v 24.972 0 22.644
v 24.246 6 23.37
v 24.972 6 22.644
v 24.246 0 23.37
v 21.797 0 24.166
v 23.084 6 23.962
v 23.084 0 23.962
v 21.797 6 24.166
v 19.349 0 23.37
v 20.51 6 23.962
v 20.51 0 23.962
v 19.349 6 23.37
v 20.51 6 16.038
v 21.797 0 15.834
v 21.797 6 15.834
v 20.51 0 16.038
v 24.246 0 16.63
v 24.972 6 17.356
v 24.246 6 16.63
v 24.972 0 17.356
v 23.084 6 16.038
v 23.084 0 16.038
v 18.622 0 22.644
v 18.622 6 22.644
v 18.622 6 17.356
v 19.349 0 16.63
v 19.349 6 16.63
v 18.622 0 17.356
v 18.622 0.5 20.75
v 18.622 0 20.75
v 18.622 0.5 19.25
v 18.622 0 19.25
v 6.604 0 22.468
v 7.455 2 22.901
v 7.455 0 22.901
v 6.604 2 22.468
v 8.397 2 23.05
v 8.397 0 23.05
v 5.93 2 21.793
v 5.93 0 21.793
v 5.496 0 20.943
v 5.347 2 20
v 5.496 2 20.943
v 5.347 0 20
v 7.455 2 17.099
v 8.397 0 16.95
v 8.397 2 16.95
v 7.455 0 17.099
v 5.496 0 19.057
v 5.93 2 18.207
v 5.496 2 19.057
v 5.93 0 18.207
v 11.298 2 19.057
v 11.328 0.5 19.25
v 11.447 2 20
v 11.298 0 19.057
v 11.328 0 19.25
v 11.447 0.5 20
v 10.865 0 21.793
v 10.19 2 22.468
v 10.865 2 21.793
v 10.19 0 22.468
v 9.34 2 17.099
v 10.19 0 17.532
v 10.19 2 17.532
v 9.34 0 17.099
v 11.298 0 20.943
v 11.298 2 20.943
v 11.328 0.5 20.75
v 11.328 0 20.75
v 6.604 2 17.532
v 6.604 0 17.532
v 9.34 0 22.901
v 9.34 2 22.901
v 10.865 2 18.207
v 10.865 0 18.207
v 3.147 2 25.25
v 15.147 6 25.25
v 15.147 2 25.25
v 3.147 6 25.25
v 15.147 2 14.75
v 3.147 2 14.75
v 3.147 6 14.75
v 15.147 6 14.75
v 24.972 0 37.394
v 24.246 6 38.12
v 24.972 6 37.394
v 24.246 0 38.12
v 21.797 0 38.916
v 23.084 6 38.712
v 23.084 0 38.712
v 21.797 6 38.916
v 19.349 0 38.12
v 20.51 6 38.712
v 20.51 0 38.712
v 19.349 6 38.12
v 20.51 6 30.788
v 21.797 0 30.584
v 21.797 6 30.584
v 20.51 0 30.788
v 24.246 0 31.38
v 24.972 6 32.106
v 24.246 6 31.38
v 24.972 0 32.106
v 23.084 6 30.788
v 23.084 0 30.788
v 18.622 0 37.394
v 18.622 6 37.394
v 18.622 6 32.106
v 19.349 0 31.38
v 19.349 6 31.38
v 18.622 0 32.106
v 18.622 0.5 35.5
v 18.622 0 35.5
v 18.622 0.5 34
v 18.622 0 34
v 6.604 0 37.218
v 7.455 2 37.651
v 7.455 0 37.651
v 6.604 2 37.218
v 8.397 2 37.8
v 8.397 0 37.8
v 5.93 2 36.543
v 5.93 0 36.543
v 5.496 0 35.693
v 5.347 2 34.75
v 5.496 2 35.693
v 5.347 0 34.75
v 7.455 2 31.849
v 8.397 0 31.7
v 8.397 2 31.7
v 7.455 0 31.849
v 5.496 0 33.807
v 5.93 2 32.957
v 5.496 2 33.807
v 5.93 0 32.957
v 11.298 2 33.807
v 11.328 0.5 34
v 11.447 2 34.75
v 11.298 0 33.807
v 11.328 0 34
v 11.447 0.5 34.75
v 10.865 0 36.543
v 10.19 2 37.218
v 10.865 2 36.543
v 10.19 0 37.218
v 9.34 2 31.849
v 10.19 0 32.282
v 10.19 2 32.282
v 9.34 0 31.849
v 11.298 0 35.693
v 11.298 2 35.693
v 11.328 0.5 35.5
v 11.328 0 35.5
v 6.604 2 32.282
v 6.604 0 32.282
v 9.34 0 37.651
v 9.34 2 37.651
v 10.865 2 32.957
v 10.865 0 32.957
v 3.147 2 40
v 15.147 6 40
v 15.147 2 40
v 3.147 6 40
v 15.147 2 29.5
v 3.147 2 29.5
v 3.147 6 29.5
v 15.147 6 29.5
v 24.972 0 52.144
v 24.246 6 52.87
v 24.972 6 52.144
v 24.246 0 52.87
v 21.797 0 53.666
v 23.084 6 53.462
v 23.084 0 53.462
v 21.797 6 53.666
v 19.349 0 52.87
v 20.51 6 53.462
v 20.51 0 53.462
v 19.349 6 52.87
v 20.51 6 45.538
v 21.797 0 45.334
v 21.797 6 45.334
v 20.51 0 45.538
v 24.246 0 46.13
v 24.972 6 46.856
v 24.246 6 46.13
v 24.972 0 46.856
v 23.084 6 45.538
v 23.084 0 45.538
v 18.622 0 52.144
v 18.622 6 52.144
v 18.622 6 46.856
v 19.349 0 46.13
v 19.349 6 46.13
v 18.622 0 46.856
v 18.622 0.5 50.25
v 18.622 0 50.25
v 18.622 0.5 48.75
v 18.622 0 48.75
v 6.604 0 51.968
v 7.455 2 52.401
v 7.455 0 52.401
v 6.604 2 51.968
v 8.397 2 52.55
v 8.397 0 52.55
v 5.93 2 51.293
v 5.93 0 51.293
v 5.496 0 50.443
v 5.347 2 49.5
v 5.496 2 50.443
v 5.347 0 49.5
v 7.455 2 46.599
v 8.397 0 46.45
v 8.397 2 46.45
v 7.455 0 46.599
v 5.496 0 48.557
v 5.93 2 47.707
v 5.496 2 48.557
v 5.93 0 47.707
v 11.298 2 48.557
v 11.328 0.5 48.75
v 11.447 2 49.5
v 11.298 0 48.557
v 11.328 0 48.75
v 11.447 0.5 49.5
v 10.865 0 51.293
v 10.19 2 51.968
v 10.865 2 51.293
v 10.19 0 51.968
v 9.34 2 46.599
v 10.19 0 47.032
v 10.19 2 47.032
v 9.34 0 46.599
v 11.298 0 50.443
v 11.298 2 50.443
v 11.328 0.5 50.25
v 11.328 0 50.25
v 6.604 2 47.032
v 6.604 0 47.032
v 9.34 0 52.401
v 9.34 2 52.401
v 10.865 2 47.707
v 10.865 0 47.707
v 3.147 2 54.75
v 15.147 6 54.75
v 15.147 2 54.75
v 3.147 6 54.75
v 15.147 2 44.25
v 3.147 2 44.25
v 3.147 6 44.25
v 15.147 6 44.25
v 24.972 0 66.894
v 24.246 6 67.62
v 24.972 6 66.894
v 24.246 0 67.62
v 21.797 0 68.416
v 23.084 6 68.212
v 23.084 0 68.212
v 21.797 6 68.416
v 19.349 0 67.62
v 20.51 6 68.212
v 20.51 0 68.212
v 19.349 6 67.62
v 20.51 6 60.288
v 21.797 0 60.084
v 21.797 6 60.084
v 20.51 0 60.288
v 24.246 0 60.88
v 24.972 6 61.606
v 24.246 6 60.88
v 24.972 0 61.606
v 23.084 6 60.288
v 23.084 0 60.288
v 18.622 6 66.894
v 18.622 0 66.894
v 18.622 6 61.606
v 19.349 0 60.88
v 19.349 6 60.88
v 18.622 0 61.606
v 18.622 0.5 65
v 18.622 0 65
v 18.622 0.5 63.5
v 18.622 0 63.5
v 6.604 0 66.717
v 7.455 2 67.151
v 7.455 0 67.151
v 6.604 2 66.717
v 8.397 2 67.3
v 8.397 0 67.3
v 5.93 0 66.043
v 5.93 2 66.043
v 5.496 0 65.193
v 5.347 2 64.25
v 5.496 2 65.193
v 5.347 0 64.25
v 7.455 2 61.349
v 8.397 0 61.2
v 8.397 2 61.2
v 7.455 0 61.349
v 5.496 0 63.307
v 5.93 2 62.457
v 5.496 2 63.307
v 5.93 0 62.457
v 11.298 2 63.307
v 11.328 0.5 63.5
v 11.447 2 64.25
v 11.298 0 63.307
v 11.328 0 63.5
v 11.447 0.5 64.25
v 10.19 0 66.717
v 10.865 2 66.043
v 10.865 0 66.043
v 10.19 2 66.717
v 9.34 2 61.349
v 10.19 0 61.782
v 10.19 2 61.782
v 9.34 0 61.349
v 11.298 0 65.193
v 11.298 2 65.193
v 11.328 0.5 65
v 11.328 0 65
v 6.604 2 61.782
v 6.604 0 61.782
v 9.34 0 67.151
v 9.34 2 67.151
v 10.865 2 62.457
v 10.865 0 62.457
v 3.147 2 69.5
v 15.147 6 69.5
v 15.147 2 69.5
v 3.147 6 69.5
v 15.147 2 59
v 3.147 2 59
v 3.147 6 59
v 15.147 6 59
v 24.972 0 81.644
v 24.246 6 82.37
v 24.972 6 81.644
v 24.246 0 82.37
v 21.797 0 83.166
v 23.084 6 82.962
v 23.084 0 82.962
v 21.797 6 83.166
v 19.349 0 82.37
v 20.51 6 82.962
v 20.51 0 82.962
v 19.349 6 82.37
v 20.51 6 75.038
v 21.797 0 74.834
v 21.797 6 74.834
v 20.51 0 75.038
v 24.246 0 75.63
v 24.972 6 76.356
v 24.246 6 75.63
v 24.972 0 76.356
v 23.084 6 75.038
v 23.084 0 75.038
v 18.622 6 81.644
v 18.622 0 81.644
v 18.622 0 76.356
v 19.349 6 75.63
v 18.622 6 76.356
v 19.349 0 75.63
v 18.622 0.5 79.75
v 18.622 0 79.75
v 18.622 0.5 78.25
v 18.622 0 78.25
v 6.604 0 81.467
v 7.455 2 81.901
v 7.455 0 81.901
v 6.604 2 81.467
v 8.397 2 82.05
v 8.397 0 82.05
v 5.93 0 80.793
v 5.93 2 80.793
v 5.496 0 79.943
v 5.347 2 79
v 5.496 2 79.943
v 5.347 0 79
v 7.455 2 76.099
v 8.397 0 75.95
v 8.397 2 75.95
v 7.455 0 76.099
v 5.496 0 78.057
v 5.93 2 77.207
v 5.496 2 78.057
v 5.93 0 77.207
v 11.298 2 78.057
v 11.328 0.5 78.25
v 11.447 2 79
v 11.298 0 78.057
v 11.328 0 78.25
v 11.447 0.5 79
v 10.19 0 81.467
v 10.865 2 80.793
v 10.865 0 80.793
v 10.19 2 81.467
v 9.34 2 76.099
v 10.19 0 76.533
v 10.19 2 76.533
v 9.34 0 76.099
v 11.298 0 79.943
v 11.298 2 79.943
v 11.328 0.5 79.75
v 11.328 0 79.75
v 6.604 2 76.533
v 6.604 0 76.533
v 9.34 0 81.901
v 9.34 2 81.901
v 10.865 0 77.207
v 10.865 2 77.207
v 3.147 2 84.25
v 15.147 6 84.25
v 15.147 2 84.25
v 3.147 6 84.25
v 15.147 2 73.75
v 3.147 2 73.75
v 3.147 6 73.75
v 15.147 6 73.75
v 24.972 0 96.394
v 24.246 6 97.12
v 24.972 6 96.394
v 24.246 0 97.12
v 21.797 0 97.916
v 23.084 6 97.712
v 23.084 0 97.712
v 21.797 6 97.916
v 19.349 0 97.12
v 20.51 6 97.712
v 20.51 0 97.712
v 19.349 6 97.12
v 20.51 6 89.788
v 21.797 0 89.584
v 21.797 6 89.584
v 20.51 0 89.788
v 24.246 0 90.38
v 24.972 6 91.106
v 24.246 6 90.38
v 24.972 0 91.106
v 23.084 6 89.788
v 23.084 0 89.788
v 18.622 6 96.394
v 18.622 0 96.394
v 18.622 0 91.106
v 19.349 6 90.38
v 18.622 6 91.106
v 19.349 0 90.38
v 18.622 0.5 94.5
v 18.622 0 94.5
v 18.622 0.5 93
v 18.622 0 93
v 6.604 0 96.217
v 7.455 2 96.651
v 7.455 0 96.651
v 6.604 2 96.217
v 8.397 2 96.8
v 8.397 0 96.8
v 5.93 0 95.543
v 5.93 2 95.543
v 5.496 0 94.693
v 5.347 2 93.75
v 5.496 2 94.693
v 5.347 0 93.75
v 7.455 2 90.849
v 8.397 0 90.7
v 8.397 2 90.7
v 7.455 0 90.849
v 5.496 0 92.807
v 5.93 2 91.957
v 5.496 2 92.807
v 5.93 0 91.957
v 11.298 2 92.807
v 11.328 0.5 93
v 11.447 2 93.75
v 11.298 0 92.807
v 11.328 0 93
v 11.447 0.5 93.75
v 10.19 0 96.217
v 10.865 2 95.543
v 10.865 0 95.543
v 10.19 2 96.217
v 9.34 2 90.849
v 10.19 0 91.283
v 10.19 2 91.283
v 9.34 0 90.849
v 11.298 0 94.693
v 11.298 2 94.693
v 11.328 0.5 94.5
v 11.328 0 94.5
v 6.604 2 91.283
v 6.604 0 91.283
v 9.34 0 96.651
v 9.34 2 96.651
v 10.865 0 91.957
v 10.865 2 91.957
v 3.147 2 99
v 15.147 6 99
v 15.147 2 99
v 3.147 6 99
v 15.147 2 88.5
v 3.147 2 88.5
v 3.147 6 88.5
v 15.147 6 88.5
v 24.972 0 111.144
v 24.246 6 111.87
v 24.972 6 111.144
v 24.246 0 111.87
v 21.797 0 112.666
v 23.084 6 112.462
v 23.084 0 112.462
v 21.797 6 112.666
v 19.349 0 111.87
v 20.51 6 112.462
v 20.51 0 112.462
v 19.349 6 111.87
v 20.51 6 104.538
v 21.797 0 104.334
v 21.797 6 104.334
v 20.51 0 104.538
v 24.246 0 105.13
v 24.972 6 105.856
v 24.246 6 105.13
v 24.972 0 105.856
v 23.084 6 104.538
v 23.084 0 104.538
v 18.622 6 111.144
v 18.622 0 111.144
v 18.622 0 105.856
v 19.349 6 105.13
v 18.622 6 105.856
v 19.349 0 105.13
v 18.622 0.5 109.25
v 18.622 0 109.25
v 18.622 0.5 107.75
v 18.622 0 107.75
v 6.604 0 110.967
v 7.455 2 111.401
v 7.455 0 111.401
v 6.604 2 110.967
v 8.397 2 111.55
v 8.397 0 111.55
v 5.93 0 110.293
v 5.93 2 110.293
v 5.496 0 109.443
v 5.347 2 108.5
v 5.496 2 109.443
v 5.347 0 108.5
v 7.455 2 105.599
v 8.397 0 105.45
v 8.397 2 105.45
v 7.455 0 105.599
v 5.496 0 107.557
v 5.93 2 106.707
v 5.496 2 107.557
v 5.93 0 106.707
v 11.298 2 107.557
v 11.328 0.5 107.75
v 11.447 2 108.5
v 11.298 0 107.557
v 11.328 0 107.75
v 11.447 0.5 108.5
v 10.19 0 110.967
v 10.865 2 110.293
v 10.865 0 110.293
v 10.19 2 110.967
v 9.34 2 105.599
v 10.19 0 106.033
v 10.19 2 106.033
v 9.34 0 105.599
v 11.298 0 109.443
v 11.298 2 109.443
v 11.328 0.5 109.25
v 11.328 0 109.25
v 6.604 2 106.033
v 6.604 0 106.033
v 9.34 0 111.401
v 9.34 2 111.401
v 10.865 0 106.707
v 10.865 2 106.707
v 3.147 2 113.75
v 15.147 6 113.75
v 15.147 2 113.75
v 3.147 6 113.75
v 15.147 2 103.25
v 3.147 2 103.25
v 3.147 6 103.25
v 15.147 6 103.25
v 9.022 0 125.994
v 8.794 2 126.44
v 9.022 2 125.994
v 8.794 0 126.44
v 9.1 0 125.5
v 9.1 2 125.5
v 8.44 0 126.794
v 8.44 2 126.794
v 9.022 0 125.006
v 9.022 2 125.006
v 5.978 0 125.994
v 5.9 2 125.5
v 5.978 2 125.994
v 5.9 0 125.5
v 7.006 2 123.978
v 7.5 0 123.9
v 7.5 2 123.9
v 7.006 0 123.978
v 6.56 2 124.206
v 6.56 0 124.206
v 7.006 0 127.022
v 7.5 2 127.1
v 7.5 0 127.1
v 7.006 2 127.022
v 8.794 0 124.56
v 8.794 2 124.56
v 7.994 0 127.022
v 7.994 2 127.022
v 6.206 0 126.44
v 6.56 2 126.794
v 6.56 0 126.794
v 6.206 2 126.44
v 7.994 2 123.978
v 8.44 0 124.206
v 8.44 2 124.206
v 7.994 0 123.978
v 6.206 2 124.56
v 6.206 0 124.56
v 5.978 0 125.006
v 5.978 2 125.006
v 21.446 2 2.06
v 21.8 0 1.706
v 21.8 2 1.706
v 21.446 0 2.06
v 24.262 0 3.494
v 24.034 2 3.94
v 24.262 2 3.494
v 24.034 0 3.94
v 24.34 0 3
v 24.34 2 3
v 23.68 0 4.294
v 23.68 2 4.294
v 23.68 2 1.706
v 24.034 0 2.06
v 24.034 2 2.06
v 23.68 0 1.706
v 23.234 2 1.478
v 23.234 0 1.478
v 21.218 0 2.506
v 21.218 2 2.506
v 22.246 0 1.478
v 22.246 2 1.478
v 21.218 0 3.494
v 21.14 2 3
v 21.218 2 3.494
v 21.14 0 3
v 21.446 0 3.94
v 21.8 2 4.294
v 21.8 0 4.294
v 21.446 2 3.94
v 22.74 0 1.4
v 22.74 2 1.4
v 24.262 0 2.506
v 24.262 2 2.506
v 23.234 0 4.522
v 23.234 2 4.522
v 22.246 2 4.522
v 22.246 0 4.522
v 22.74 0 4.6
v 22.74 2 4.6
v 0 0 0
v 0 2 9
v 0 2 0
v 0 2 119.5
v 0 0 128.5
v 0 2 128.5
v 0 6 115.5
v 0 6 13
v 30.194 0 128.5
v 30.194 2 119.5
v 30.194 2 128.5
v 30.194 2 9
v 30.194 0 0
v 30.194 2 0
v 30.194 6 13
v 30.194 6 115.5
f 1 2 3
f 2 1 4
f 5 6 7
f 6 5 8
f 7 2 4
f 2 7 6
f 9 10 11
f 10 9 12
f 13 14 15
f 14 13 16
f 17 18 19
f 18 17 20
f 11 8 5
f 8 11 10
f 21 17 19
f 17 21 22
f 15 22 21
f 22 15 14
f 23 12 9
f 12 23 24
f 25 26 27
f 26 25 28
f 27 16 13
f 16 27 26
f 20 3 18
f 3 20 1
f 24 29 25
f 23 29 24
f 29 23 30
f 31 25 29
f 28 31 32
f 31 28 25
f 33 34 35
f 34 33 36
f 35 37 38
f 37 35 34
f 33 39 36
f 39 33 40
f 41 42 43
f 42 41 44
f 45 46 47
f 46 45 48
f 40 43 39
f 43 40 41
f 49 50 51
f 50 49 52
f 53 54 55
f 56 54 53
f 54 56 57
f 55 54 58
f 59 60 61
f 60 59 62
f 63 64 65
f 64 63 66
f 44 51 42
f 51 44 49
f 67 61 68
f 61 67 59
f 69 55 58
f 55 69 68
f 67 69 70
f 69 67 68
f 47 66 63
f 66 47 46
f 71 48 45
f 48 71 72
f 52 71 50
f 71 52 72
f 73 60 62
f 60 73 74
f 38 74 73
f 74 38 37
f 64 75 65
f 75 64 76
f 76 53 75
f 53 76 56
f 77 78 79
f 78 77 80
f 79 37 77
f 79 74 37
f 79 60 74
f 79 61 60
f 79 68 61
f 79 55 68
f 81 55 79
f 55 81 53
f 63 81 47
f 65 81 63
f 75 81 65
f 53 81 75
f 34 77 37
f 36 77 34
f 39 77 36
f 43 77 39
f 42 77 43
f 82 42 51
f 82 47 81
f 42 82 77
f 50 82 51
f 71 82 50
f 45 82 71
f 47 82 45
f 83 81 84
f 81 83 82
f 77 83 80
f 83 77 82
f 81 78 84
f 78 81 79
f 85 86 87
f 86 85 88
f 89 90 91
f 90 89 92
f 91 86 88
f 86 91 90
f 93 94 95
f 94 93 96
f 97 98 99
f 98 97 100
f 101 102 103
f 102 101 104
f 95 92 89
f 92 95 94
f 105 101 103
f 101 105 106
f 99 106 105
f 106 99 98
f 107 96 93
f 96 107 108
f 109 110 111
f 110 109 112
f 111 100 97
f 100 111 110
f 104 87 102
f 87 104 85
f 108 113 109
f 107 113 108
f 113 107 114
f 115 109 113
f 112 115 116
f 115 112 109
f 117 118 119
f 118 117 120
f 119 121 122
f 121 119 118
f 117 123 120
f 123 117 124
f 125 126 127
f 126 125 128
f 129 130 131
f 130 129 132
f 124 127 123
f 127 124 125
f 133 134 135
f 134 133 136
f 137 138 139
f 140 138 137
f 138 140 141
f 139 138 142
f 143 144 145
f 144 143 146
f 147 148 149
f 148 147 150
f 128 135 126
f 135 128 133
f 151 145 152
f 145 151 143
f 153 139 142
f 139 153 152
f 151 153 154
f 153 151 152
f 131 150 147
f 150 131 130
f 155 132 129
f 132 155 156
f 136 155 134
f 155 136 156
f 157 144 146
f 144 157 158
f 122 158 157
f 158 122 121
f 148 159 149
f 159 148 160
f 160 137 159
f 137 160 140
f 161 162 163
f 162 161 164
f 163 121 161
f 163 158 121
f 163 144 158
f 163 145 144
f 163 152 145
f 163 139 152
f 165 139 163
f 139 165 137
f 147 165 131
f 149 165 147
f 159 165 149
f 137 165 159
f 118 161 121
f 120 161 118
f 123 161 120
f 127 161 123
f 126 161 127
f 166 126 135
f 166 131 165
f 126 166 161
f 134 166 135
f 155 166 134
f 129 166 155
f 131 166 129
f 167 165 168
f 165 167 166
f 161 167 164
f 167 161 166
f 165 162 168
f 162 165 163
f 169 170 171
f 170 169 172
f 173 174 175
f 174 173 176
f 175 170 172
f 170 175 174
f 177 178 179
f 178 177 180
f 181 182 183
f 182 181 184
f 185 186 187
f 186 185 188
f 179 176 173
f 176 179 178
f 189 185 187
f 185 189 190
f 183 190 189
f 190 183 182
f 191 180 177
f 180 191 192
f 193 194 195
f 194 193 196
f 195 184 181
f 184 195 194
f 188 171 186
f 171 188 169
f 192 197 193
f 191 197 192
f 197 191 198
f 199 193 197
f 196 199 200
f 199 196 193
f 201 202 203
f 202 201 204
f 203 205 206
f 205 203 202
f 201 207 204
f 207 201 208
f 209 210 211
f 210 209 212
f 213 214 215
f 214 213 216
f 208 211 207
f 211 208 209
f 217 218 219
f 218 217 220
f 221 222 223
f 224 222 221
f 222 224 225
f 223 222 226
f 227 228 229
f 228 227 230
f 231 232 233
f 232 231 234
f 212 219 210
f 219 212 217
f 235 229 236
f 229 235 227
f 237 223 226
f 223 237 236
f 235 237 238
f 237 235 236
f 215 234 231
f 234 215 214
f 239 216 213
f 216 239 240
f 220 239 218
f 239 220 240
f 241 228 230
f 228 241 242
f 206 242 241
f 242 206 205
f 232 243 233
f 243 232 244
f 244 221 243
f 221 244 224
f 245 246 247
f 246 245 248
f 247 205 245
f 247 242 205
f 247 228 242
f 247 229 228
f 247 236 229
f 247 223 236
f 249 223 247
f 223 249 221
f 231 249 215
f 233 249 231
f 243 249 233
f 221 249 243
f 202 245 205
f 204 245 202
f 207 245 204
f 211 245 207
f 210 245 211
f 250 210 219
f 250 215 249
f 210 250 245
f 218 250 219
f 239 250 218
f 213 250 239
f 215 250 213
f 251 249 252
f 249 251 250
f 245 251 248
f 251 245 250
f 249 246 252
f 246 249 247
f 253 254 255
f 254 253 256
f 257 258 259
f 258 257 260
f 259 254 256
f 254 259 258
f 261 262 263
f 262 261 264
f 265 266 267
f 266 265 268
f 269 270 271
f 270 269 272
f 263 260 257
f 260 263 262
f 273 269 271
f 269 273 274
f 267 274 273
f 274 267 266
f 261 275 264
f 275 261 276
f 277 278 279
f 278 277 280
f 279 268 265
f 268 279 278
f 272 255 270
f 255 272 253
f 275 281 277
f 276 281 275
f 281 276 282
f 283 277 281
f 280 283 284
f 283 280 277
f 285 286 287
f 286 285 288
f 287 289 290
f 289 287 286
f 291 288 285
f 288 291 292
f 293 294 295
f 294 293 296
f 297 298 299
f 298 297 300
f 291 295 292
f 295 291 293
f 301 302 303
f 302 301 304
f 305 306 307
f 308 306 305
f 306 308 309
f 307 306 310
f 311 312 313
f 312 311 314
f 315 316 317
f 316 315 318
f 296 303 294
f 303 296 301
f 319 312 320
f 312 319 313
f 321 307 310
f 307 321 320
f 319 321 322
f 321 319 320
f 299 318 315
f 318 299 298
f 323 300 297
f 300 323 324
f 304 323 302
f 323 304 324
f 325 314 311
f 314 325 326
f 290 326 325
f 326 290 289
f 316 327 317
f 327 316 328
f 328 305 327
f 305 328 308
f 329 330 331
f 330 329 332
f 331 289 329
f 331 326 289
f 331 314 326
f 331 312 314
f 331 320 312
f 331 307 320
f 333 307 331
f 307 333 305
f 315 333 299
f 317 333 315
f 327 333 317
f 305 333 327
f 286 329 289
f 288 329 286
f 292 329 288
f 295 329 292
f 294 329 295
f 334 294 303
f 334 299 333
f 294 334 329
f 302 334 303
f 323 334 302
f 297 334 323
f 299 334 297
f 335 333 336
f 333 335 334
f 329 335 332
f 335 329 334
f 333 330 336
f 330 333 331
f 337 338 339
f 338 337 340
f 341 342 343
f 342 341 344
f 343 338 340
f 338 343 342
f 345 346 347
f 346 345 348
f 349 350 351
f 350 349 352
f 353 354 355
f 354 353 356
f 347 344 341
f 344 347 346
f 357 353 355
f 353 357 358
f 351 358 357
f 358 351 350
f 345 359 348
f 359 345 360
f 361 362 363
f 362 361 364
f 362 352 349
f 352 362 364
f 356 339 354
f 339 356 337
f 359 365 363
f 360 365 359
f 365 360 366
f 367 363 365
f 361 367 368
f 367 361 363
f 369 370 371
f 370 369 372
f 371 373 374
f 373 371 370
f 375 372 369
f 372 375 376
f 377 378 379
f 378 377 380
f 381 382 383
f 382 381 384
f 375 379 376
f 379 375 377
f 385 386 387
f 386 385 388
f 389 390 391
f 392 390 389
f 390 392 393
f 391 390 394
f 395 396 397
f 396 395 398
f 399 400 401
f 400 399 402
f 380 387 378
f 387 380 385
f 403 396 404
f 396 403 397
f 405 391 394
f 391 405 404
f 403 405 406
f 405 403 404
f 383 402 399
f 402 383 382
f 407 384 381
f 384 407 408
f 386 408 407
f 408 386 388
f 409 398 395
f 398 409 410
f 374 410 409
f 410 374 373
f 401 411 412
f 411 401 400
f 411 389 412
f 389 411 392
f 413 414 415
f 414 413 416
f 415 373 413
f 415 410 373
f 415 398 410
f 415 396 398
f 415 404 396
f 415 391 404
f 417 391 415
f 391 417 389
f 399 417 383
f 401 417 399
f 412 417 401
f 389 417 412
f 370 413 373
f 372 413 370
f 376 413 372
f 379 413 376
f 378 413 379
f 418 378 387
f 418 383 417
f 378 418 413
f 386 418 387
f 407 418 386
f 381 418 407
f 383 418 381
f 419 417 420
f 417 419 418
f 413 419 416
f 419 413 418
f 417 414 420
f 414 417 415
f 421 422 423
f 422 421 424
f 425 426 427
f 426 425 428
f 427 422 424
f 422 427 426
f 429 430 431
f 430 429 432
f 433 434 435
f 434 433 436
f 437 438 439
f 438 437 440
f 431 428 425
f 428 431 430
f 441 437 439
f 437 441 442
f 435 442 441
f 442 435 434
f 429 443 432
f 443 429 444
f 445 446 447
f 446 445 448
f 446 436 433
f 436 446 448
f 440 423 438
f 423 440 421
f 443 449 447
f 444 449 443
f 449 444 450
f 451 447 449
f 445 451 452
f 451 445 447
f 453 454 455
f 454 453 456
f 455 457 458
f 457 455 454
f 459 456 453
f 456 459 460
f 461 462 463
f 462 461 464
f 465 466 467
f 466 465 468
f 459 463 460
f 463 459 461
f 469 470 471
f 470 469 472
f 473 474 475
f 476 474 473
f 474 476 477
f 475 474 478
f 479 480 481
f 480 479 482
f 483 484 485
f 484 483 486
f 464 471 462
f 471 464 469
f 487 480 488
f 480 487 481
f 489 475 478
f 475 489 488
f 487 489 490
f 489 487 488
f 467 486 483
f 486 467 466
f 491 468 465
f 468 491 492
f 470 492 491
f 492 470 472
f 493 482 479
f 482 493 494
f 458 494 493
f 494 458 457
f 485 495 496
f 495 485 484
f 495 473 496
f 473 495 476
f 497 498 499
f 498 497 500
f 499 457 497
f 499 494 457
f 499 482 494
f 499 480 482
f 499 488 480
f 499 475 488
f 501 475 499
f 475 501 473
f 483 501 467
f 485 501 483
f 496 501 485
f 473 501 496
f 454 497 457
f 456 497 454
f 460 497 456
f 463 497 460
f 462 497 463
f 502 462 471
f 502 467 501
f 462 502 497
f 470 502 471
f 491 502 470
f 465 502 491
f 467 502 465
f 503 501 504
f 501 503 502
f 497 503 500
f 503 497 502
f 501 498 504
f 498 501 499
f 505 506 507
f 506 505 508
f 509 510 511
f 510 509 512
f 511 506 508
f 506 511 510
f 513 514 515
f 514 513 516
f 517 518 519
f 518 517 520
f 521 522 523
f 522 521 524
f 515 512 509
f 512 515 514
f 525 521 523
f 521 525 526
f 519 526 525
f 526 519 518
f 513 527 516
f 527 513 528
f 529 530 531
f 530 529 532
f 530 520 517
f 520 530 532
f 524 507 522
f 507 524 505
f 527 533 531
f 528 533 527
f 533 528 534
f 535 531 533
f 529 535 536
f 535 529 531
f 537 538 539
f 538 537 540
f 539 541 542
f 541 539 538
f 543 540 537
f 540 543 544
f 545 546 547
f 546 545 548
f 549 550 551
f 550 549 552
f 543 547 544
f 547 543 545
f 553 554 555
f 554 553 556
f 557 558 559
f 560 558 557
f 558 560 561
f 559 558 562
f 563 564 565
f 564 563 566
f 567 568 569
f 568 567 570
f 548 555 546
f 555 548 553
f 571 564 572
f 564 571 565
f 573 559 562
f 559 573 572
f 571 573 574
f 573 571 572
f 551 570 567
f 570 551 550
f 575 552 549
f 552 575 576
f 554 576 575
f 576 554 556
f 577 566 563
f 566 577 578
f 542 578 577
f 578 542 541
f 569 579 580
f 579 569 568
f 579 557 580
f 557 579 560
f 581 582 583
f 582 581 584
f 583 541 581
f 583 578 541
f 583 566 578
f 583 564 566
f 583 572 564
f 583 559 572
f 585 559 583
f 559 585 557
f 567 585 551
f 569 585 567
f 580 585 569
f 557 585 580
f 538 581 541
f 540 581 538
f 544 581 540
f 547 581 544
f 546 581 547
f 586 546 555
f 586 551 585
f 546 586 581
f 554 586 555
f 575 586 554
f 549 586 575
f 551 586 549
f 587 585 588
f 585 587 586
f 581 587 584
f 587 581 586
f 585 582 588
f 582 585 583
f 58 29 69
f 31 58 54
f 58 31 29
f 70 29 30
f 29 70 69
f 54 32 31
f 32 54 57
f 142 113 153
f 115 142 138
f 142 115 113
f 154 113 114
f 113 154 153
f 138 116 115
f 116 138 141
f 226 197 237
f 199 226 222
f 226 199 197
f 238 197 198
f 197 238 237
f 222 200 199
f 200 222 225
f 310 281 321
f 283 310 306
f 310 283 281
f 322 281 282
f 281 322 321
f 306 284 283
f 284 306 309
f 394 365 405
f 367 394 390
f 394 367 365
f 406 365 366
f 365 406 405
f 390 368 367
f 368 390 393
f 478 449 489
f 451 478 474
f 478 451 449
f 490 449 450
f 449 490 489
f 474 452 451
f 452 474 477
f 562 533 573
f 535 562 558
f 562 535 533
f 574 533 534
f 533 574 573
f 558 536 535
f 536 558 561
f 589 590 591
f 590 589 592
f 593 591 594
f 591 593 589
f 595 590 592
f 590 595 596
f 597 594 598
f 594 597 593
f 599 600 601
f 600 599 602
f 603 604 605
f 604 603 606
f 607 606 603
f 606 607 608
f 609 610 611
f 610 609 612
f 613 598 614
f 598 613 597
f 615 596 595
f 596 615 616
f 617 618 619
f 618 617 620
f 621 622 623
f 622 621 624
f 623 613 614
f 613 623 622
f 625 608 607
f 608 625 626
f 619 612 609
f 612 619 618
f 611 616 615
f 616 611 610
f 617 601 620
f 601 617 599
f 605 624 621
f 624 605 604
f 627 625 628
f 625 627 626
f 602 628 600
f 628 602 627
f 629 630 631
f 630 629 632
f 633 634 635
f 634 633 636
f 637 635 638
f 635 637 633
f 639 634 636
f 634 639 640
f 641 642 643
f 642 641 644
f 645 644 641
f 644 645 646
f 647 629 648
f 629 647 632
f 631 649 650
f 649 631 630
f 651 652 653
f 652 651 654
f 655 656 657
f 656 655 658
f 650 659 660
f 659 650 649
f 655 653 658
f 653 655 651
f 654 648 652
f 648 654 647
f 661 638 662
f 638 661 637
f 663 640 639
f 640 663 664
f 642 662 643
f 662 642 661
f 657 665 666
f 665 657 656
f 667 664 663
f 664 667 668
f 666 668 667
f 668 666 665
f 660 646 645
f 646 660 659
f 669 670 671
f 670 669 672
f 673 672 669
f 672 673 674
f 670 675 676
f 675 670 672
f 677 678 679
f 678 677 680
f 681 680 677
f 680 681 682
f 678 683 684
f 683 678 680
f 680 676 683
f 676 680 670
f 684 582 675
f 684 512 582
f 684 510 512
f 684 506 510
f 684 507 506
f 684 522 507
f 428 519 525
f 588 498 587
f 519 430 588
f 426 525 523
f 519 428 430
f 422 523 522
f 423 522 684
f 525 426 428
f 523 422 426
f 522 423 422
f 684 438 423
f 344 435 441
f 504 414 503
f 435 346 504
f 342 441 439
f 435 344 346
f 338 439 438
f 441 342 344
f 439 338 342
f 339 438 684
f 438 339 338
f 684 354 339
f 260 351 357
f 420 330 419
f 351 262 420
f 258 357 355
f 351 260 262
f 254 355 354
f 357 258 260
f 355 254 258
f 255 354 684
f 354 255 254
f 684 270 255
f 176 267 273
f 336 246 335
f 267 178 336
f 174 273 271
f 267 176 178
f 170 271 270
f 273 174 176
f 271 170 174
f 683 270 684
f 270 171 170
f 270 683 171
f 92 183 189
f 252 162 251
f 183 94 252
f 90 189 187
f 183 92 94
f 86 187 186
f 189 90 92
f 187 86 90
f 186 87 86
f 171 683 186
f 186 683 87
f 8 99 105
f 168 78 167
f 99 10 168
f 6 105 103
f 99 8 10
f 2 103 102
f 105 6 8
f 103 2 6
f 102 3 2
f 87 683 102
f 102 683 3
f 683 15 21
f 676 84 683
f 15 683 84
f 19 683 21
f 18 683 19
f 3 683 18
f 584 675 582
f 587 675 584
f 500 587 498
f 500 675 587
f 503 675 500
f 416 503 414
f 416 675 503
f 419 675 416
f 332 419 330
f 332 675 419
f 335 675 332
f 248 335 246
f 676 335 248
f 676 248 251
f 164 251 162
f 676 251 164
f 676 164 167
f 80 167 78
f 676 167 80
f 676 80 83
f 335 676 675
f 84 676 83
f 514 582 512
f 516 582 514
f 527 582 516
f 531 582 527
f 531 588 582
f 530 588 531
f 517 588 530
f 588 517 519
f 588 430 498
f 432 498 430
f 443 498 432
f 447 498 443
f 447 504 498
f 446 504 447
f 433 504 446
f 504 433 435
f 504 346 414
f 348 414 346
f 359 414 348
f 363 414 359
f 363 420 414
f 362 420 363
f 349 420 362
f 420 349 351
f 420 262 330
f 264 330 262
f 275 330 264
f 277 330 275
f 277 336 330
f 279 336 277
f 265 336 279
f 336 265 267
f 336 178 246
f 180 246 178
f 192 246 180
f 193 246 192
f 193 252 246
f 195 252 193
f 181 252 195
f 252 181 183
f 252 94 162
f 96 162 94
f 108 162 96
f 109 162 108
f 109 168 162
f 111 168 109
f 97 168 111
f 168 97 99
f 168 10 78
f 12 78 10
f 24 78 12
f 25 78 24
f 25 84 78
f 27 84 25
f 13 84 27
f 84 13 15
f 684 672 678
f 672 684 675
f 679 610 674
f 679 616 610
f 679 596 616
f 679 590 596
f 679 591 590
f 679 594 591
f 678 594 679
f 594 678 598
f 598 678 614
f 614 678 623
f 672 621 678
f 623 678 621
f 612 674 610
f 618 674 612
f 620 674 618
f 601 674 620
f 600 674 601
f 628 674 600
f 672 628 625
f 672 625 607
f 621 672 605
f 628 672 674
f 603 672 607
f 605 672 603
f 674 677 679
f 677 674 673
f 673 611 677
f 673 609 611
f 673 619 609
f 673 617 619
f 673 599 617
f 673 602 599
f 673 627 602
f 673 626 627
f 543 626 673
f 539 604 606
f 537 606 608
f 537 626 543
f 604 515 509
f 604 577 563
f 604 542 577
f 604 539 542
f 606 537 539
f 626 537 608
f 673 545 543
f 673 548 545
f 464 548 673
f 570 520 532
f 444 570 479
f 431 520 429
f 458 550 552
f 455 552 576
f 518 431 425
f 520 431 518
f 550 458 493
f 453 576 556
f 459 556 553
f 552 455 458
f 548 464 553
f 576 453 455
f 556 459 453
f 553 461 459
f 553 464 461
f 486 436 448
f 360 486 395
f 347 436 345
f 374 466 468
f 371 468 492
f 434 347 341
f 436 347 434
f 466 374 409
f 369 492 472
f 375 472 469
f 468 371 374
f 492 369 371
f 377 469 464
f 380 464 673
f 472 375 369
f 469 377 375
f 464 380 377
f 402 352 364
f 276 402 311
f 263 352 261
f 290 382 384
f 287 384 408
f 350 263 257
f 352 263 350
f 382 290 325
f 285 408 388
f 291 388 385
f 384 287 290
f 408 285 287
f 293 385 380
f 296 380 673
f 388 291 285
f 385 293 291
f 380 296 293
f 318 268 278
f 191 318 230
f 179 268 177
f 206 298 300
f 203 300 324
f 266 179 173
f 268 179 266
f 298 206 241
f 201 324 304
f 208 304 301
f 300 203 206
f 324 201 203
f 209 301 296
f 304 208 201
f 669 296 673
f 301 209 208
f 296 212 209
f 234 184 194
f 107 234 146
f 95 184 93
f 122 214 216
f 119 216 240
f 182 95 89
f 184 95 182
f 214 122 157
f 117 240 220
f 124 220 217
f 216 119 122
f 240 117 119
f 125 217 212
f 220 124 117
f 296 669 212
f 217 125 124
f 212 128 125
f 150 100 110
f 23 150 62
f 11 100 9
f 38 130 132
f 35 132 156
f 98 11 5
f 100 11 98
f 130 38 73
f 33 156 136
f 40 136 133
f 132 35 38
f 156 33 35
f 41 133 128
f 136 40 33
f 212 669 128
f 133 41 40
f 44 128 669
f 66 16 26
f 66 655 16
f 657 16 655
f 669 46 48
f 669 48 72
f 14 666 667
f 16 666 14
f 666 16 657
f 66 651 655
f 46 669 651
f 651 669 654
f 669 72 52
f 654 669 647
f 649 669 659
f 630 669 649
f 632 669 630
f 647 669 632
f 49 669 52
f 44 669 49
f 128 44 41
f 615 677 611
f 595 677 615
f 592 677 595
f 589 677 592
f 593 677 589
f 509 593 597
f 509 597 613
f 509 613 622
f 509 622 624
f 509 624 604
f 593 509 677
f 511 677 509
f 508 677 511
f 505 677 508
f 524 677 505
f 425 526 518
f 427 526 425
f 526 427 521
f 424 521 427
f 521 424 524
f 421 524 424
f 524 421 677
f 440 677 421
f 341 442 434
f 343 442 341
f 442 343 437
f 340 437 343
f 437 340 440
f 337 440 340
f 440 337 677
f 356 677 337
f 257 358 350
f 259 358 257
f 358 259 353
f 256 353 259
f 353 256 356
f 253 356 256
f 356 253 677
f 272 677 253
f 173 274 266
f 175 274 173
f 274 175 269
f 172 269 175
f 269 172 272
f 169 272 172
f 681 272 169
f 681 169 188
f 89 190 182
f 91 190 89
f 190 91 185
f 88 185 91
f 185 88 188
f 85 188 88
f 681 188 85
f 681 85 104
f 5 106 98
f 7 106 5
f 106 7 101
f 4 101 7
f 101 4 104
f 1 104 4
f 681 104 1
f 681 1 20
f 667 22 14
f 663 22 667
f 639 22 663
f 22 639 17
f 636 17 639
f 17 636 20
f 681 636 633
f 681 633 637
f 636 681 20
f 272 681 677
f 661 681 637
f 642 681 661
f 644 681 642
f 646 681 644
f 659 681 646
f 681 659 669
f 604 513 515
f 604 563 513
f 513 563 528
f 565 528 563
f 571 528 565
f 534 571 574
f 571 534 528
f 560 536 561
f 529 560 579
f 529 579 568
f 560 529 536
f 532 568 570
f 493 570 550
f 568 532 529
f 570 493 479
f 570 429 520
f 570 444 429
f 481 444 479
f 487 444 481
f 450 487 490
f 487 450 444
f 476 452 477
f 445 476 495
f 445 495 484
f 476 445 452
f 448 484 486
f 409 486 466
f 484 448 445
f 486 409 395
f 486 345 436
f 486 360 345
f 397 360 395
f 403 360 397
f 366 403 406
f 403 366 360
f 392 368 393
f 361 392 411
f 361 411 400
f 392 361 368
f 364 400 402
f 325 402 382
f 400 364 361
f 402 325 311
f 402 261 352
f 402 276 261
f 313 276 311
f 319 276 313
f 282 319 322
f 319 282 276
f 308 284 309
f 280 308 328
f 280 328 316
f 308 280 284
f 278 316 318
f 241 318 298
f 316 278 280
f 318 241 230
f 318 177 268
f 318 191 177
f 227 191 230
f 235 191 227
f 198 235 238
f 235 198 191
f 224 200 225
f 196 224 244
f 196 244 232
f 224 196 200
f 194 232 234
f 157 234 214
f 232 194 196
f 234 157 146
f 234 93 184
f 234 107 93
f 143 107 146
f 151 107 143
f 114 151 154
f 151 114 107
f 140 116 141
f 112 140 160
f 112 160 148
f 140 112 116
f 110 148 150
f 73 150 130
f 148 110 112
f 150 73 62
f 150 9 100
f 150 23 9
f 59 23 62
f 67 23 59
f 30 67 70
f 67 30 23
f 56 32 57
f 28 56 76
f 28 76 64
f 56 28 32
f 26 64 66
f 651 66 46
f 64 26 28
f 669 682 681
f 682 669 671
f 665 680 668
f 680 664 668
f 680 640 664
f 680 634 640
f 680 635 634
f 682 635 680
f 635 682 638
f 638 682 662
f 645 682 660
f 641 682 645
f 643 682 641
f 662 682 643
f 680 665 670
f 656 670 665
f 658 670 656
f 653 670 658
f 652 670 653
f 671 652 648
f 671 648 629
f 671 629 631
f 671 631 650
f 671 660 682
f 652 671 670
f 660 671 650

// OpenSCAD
// file: eurorack_panel.scad
module eurorack_panel(hp = 14, full_thickness = 6, bevel_angle = 45, label = "auto") {
    // approximation of doepfer standard
    width = 5.077183587 * hp - 0.2690561803;
    height = 128.5;
    m3_hole_dia = 3.2;
    text_thickness = 0.4;

    hp_width = 5.08;
    first_hole_offset = 7.5 - hp_width + (hp>2?hp_width:0);
    last_hole_offset = first_hole_offset + (hp_width * (hp - 3));
    echo(last_hole_offset);

    panel_thickness = 2;
    panel_safe_height = 9;
    panel_bevel_disatance = panel_safe_height + (full_thickness - panel_thickness) * 1;

    all_holes = hp >= 12;
    diag_holes = hp >= 6 && !all_holes;
    
    difference() {
        rotate([90, 0, 90]) linear_extrude(height = width)
        polygon([[0, 0],
            [panel_thickness, 0],
            [panel_thickness, panel_safe_height],
            [full_thickness, panel_bevel_disatance],
            [full_thickness, height-panel_bevel_disatance],
            [panel_thickness, height-panel_safe_height],
            [panel_thickness, height],
            [0,height]]);
        
        rotate([90,0,0]) {
            translate([first_hole_offset,height-3])
            cylinder(h = 99, d = m3_hole_dia, center = true);
            
            if(!diag_holes) {
                translate([first_hole_offset,3])
                cylinder(h = 99, d = m3_hole_dia, center = true);
            }
            
            if(all_holes) {
                translate([last_hole_offset,height-3])
                cylinder(h = 99, d = m3_hole_dia, center = true);
            }
            
            if(all_holes || diag_holes) {
                translate([last_hole_offset,3]) 
                cylinder(h = 99, d = m3_hole_dia, center = true);
            }
            
            translate([width/2,height/2])
            children();
        }
    }
    
    text_size = min(10, hp*3.1);
    text_rotation = (hp > 5)?0:90;
    color("orange")
    translate([width/2,full_thickness,height/2]) 
    rotate([90, text_rotation, 180])
    linear_extrude(text_thickness)
    text(label=="auto"?str(width_hp, "hp"):label, size=text_size, halign="center", valign="center");
}


module banana(t=[0,0,0], r = 0) {
    translate(t)
    rotate(r)
    render() intersection() {
        cylinder(h = 99, r = 4.1656, center = true);
        cube([6.35, 4.1656*2, 99], center=true);
    }
}

module phono35mm(t=[0,0,0], r = 0) {
    translate(t) rotate(r) {
        cylinder(h = 99, d = 6.1, center = true);
    
        translate([0,(4.5-6)/2,-12])
        cube([10.5,12,20], center=true);
    }
}

module line(a, b, width=1.5, depth=1) {
    l = sqrt(pow(a[0]-b[0],2)+pow(a[1]-b[1],2));
    
    translate([(a[0]+b[0]),(a[1]+b[1])/2])
    rotate([0,0,atan2(a[1]-b[1],a[0]-b[0])])
    cube([l,width,depth],center = true);
}

$fn=20;

hp_width = 5.08;

for(p = [1 : 24]) {
  translate([((p-1)*(p/2)) * hp_width*1.05,0,0])
  eurorack_panel(hp=p);    
}
// main file
use <eurorack_panel.scad>;
$fn=2;

height = 128.5;
safe = 20;

hp = 6;
x_offset = 6.7;
y_offset = 0;

count = 7;

banana_pos = [x_offset,y_offset];
phono35mm_pos = [-x_offset,-y_offset];

eurorack_panel(hp=hp, label=false) {
    h = height-safe*2;
    for(y=[-h/2:h/(count-1):h/2]) {
        base = [0, y];
        banana(base + banana_pos) ;
        phono35mm(base + phono35mm_pos, 90);
        line(base + banana_pos, base + phono35mm_pos);
    }
}

$fn = 100;
